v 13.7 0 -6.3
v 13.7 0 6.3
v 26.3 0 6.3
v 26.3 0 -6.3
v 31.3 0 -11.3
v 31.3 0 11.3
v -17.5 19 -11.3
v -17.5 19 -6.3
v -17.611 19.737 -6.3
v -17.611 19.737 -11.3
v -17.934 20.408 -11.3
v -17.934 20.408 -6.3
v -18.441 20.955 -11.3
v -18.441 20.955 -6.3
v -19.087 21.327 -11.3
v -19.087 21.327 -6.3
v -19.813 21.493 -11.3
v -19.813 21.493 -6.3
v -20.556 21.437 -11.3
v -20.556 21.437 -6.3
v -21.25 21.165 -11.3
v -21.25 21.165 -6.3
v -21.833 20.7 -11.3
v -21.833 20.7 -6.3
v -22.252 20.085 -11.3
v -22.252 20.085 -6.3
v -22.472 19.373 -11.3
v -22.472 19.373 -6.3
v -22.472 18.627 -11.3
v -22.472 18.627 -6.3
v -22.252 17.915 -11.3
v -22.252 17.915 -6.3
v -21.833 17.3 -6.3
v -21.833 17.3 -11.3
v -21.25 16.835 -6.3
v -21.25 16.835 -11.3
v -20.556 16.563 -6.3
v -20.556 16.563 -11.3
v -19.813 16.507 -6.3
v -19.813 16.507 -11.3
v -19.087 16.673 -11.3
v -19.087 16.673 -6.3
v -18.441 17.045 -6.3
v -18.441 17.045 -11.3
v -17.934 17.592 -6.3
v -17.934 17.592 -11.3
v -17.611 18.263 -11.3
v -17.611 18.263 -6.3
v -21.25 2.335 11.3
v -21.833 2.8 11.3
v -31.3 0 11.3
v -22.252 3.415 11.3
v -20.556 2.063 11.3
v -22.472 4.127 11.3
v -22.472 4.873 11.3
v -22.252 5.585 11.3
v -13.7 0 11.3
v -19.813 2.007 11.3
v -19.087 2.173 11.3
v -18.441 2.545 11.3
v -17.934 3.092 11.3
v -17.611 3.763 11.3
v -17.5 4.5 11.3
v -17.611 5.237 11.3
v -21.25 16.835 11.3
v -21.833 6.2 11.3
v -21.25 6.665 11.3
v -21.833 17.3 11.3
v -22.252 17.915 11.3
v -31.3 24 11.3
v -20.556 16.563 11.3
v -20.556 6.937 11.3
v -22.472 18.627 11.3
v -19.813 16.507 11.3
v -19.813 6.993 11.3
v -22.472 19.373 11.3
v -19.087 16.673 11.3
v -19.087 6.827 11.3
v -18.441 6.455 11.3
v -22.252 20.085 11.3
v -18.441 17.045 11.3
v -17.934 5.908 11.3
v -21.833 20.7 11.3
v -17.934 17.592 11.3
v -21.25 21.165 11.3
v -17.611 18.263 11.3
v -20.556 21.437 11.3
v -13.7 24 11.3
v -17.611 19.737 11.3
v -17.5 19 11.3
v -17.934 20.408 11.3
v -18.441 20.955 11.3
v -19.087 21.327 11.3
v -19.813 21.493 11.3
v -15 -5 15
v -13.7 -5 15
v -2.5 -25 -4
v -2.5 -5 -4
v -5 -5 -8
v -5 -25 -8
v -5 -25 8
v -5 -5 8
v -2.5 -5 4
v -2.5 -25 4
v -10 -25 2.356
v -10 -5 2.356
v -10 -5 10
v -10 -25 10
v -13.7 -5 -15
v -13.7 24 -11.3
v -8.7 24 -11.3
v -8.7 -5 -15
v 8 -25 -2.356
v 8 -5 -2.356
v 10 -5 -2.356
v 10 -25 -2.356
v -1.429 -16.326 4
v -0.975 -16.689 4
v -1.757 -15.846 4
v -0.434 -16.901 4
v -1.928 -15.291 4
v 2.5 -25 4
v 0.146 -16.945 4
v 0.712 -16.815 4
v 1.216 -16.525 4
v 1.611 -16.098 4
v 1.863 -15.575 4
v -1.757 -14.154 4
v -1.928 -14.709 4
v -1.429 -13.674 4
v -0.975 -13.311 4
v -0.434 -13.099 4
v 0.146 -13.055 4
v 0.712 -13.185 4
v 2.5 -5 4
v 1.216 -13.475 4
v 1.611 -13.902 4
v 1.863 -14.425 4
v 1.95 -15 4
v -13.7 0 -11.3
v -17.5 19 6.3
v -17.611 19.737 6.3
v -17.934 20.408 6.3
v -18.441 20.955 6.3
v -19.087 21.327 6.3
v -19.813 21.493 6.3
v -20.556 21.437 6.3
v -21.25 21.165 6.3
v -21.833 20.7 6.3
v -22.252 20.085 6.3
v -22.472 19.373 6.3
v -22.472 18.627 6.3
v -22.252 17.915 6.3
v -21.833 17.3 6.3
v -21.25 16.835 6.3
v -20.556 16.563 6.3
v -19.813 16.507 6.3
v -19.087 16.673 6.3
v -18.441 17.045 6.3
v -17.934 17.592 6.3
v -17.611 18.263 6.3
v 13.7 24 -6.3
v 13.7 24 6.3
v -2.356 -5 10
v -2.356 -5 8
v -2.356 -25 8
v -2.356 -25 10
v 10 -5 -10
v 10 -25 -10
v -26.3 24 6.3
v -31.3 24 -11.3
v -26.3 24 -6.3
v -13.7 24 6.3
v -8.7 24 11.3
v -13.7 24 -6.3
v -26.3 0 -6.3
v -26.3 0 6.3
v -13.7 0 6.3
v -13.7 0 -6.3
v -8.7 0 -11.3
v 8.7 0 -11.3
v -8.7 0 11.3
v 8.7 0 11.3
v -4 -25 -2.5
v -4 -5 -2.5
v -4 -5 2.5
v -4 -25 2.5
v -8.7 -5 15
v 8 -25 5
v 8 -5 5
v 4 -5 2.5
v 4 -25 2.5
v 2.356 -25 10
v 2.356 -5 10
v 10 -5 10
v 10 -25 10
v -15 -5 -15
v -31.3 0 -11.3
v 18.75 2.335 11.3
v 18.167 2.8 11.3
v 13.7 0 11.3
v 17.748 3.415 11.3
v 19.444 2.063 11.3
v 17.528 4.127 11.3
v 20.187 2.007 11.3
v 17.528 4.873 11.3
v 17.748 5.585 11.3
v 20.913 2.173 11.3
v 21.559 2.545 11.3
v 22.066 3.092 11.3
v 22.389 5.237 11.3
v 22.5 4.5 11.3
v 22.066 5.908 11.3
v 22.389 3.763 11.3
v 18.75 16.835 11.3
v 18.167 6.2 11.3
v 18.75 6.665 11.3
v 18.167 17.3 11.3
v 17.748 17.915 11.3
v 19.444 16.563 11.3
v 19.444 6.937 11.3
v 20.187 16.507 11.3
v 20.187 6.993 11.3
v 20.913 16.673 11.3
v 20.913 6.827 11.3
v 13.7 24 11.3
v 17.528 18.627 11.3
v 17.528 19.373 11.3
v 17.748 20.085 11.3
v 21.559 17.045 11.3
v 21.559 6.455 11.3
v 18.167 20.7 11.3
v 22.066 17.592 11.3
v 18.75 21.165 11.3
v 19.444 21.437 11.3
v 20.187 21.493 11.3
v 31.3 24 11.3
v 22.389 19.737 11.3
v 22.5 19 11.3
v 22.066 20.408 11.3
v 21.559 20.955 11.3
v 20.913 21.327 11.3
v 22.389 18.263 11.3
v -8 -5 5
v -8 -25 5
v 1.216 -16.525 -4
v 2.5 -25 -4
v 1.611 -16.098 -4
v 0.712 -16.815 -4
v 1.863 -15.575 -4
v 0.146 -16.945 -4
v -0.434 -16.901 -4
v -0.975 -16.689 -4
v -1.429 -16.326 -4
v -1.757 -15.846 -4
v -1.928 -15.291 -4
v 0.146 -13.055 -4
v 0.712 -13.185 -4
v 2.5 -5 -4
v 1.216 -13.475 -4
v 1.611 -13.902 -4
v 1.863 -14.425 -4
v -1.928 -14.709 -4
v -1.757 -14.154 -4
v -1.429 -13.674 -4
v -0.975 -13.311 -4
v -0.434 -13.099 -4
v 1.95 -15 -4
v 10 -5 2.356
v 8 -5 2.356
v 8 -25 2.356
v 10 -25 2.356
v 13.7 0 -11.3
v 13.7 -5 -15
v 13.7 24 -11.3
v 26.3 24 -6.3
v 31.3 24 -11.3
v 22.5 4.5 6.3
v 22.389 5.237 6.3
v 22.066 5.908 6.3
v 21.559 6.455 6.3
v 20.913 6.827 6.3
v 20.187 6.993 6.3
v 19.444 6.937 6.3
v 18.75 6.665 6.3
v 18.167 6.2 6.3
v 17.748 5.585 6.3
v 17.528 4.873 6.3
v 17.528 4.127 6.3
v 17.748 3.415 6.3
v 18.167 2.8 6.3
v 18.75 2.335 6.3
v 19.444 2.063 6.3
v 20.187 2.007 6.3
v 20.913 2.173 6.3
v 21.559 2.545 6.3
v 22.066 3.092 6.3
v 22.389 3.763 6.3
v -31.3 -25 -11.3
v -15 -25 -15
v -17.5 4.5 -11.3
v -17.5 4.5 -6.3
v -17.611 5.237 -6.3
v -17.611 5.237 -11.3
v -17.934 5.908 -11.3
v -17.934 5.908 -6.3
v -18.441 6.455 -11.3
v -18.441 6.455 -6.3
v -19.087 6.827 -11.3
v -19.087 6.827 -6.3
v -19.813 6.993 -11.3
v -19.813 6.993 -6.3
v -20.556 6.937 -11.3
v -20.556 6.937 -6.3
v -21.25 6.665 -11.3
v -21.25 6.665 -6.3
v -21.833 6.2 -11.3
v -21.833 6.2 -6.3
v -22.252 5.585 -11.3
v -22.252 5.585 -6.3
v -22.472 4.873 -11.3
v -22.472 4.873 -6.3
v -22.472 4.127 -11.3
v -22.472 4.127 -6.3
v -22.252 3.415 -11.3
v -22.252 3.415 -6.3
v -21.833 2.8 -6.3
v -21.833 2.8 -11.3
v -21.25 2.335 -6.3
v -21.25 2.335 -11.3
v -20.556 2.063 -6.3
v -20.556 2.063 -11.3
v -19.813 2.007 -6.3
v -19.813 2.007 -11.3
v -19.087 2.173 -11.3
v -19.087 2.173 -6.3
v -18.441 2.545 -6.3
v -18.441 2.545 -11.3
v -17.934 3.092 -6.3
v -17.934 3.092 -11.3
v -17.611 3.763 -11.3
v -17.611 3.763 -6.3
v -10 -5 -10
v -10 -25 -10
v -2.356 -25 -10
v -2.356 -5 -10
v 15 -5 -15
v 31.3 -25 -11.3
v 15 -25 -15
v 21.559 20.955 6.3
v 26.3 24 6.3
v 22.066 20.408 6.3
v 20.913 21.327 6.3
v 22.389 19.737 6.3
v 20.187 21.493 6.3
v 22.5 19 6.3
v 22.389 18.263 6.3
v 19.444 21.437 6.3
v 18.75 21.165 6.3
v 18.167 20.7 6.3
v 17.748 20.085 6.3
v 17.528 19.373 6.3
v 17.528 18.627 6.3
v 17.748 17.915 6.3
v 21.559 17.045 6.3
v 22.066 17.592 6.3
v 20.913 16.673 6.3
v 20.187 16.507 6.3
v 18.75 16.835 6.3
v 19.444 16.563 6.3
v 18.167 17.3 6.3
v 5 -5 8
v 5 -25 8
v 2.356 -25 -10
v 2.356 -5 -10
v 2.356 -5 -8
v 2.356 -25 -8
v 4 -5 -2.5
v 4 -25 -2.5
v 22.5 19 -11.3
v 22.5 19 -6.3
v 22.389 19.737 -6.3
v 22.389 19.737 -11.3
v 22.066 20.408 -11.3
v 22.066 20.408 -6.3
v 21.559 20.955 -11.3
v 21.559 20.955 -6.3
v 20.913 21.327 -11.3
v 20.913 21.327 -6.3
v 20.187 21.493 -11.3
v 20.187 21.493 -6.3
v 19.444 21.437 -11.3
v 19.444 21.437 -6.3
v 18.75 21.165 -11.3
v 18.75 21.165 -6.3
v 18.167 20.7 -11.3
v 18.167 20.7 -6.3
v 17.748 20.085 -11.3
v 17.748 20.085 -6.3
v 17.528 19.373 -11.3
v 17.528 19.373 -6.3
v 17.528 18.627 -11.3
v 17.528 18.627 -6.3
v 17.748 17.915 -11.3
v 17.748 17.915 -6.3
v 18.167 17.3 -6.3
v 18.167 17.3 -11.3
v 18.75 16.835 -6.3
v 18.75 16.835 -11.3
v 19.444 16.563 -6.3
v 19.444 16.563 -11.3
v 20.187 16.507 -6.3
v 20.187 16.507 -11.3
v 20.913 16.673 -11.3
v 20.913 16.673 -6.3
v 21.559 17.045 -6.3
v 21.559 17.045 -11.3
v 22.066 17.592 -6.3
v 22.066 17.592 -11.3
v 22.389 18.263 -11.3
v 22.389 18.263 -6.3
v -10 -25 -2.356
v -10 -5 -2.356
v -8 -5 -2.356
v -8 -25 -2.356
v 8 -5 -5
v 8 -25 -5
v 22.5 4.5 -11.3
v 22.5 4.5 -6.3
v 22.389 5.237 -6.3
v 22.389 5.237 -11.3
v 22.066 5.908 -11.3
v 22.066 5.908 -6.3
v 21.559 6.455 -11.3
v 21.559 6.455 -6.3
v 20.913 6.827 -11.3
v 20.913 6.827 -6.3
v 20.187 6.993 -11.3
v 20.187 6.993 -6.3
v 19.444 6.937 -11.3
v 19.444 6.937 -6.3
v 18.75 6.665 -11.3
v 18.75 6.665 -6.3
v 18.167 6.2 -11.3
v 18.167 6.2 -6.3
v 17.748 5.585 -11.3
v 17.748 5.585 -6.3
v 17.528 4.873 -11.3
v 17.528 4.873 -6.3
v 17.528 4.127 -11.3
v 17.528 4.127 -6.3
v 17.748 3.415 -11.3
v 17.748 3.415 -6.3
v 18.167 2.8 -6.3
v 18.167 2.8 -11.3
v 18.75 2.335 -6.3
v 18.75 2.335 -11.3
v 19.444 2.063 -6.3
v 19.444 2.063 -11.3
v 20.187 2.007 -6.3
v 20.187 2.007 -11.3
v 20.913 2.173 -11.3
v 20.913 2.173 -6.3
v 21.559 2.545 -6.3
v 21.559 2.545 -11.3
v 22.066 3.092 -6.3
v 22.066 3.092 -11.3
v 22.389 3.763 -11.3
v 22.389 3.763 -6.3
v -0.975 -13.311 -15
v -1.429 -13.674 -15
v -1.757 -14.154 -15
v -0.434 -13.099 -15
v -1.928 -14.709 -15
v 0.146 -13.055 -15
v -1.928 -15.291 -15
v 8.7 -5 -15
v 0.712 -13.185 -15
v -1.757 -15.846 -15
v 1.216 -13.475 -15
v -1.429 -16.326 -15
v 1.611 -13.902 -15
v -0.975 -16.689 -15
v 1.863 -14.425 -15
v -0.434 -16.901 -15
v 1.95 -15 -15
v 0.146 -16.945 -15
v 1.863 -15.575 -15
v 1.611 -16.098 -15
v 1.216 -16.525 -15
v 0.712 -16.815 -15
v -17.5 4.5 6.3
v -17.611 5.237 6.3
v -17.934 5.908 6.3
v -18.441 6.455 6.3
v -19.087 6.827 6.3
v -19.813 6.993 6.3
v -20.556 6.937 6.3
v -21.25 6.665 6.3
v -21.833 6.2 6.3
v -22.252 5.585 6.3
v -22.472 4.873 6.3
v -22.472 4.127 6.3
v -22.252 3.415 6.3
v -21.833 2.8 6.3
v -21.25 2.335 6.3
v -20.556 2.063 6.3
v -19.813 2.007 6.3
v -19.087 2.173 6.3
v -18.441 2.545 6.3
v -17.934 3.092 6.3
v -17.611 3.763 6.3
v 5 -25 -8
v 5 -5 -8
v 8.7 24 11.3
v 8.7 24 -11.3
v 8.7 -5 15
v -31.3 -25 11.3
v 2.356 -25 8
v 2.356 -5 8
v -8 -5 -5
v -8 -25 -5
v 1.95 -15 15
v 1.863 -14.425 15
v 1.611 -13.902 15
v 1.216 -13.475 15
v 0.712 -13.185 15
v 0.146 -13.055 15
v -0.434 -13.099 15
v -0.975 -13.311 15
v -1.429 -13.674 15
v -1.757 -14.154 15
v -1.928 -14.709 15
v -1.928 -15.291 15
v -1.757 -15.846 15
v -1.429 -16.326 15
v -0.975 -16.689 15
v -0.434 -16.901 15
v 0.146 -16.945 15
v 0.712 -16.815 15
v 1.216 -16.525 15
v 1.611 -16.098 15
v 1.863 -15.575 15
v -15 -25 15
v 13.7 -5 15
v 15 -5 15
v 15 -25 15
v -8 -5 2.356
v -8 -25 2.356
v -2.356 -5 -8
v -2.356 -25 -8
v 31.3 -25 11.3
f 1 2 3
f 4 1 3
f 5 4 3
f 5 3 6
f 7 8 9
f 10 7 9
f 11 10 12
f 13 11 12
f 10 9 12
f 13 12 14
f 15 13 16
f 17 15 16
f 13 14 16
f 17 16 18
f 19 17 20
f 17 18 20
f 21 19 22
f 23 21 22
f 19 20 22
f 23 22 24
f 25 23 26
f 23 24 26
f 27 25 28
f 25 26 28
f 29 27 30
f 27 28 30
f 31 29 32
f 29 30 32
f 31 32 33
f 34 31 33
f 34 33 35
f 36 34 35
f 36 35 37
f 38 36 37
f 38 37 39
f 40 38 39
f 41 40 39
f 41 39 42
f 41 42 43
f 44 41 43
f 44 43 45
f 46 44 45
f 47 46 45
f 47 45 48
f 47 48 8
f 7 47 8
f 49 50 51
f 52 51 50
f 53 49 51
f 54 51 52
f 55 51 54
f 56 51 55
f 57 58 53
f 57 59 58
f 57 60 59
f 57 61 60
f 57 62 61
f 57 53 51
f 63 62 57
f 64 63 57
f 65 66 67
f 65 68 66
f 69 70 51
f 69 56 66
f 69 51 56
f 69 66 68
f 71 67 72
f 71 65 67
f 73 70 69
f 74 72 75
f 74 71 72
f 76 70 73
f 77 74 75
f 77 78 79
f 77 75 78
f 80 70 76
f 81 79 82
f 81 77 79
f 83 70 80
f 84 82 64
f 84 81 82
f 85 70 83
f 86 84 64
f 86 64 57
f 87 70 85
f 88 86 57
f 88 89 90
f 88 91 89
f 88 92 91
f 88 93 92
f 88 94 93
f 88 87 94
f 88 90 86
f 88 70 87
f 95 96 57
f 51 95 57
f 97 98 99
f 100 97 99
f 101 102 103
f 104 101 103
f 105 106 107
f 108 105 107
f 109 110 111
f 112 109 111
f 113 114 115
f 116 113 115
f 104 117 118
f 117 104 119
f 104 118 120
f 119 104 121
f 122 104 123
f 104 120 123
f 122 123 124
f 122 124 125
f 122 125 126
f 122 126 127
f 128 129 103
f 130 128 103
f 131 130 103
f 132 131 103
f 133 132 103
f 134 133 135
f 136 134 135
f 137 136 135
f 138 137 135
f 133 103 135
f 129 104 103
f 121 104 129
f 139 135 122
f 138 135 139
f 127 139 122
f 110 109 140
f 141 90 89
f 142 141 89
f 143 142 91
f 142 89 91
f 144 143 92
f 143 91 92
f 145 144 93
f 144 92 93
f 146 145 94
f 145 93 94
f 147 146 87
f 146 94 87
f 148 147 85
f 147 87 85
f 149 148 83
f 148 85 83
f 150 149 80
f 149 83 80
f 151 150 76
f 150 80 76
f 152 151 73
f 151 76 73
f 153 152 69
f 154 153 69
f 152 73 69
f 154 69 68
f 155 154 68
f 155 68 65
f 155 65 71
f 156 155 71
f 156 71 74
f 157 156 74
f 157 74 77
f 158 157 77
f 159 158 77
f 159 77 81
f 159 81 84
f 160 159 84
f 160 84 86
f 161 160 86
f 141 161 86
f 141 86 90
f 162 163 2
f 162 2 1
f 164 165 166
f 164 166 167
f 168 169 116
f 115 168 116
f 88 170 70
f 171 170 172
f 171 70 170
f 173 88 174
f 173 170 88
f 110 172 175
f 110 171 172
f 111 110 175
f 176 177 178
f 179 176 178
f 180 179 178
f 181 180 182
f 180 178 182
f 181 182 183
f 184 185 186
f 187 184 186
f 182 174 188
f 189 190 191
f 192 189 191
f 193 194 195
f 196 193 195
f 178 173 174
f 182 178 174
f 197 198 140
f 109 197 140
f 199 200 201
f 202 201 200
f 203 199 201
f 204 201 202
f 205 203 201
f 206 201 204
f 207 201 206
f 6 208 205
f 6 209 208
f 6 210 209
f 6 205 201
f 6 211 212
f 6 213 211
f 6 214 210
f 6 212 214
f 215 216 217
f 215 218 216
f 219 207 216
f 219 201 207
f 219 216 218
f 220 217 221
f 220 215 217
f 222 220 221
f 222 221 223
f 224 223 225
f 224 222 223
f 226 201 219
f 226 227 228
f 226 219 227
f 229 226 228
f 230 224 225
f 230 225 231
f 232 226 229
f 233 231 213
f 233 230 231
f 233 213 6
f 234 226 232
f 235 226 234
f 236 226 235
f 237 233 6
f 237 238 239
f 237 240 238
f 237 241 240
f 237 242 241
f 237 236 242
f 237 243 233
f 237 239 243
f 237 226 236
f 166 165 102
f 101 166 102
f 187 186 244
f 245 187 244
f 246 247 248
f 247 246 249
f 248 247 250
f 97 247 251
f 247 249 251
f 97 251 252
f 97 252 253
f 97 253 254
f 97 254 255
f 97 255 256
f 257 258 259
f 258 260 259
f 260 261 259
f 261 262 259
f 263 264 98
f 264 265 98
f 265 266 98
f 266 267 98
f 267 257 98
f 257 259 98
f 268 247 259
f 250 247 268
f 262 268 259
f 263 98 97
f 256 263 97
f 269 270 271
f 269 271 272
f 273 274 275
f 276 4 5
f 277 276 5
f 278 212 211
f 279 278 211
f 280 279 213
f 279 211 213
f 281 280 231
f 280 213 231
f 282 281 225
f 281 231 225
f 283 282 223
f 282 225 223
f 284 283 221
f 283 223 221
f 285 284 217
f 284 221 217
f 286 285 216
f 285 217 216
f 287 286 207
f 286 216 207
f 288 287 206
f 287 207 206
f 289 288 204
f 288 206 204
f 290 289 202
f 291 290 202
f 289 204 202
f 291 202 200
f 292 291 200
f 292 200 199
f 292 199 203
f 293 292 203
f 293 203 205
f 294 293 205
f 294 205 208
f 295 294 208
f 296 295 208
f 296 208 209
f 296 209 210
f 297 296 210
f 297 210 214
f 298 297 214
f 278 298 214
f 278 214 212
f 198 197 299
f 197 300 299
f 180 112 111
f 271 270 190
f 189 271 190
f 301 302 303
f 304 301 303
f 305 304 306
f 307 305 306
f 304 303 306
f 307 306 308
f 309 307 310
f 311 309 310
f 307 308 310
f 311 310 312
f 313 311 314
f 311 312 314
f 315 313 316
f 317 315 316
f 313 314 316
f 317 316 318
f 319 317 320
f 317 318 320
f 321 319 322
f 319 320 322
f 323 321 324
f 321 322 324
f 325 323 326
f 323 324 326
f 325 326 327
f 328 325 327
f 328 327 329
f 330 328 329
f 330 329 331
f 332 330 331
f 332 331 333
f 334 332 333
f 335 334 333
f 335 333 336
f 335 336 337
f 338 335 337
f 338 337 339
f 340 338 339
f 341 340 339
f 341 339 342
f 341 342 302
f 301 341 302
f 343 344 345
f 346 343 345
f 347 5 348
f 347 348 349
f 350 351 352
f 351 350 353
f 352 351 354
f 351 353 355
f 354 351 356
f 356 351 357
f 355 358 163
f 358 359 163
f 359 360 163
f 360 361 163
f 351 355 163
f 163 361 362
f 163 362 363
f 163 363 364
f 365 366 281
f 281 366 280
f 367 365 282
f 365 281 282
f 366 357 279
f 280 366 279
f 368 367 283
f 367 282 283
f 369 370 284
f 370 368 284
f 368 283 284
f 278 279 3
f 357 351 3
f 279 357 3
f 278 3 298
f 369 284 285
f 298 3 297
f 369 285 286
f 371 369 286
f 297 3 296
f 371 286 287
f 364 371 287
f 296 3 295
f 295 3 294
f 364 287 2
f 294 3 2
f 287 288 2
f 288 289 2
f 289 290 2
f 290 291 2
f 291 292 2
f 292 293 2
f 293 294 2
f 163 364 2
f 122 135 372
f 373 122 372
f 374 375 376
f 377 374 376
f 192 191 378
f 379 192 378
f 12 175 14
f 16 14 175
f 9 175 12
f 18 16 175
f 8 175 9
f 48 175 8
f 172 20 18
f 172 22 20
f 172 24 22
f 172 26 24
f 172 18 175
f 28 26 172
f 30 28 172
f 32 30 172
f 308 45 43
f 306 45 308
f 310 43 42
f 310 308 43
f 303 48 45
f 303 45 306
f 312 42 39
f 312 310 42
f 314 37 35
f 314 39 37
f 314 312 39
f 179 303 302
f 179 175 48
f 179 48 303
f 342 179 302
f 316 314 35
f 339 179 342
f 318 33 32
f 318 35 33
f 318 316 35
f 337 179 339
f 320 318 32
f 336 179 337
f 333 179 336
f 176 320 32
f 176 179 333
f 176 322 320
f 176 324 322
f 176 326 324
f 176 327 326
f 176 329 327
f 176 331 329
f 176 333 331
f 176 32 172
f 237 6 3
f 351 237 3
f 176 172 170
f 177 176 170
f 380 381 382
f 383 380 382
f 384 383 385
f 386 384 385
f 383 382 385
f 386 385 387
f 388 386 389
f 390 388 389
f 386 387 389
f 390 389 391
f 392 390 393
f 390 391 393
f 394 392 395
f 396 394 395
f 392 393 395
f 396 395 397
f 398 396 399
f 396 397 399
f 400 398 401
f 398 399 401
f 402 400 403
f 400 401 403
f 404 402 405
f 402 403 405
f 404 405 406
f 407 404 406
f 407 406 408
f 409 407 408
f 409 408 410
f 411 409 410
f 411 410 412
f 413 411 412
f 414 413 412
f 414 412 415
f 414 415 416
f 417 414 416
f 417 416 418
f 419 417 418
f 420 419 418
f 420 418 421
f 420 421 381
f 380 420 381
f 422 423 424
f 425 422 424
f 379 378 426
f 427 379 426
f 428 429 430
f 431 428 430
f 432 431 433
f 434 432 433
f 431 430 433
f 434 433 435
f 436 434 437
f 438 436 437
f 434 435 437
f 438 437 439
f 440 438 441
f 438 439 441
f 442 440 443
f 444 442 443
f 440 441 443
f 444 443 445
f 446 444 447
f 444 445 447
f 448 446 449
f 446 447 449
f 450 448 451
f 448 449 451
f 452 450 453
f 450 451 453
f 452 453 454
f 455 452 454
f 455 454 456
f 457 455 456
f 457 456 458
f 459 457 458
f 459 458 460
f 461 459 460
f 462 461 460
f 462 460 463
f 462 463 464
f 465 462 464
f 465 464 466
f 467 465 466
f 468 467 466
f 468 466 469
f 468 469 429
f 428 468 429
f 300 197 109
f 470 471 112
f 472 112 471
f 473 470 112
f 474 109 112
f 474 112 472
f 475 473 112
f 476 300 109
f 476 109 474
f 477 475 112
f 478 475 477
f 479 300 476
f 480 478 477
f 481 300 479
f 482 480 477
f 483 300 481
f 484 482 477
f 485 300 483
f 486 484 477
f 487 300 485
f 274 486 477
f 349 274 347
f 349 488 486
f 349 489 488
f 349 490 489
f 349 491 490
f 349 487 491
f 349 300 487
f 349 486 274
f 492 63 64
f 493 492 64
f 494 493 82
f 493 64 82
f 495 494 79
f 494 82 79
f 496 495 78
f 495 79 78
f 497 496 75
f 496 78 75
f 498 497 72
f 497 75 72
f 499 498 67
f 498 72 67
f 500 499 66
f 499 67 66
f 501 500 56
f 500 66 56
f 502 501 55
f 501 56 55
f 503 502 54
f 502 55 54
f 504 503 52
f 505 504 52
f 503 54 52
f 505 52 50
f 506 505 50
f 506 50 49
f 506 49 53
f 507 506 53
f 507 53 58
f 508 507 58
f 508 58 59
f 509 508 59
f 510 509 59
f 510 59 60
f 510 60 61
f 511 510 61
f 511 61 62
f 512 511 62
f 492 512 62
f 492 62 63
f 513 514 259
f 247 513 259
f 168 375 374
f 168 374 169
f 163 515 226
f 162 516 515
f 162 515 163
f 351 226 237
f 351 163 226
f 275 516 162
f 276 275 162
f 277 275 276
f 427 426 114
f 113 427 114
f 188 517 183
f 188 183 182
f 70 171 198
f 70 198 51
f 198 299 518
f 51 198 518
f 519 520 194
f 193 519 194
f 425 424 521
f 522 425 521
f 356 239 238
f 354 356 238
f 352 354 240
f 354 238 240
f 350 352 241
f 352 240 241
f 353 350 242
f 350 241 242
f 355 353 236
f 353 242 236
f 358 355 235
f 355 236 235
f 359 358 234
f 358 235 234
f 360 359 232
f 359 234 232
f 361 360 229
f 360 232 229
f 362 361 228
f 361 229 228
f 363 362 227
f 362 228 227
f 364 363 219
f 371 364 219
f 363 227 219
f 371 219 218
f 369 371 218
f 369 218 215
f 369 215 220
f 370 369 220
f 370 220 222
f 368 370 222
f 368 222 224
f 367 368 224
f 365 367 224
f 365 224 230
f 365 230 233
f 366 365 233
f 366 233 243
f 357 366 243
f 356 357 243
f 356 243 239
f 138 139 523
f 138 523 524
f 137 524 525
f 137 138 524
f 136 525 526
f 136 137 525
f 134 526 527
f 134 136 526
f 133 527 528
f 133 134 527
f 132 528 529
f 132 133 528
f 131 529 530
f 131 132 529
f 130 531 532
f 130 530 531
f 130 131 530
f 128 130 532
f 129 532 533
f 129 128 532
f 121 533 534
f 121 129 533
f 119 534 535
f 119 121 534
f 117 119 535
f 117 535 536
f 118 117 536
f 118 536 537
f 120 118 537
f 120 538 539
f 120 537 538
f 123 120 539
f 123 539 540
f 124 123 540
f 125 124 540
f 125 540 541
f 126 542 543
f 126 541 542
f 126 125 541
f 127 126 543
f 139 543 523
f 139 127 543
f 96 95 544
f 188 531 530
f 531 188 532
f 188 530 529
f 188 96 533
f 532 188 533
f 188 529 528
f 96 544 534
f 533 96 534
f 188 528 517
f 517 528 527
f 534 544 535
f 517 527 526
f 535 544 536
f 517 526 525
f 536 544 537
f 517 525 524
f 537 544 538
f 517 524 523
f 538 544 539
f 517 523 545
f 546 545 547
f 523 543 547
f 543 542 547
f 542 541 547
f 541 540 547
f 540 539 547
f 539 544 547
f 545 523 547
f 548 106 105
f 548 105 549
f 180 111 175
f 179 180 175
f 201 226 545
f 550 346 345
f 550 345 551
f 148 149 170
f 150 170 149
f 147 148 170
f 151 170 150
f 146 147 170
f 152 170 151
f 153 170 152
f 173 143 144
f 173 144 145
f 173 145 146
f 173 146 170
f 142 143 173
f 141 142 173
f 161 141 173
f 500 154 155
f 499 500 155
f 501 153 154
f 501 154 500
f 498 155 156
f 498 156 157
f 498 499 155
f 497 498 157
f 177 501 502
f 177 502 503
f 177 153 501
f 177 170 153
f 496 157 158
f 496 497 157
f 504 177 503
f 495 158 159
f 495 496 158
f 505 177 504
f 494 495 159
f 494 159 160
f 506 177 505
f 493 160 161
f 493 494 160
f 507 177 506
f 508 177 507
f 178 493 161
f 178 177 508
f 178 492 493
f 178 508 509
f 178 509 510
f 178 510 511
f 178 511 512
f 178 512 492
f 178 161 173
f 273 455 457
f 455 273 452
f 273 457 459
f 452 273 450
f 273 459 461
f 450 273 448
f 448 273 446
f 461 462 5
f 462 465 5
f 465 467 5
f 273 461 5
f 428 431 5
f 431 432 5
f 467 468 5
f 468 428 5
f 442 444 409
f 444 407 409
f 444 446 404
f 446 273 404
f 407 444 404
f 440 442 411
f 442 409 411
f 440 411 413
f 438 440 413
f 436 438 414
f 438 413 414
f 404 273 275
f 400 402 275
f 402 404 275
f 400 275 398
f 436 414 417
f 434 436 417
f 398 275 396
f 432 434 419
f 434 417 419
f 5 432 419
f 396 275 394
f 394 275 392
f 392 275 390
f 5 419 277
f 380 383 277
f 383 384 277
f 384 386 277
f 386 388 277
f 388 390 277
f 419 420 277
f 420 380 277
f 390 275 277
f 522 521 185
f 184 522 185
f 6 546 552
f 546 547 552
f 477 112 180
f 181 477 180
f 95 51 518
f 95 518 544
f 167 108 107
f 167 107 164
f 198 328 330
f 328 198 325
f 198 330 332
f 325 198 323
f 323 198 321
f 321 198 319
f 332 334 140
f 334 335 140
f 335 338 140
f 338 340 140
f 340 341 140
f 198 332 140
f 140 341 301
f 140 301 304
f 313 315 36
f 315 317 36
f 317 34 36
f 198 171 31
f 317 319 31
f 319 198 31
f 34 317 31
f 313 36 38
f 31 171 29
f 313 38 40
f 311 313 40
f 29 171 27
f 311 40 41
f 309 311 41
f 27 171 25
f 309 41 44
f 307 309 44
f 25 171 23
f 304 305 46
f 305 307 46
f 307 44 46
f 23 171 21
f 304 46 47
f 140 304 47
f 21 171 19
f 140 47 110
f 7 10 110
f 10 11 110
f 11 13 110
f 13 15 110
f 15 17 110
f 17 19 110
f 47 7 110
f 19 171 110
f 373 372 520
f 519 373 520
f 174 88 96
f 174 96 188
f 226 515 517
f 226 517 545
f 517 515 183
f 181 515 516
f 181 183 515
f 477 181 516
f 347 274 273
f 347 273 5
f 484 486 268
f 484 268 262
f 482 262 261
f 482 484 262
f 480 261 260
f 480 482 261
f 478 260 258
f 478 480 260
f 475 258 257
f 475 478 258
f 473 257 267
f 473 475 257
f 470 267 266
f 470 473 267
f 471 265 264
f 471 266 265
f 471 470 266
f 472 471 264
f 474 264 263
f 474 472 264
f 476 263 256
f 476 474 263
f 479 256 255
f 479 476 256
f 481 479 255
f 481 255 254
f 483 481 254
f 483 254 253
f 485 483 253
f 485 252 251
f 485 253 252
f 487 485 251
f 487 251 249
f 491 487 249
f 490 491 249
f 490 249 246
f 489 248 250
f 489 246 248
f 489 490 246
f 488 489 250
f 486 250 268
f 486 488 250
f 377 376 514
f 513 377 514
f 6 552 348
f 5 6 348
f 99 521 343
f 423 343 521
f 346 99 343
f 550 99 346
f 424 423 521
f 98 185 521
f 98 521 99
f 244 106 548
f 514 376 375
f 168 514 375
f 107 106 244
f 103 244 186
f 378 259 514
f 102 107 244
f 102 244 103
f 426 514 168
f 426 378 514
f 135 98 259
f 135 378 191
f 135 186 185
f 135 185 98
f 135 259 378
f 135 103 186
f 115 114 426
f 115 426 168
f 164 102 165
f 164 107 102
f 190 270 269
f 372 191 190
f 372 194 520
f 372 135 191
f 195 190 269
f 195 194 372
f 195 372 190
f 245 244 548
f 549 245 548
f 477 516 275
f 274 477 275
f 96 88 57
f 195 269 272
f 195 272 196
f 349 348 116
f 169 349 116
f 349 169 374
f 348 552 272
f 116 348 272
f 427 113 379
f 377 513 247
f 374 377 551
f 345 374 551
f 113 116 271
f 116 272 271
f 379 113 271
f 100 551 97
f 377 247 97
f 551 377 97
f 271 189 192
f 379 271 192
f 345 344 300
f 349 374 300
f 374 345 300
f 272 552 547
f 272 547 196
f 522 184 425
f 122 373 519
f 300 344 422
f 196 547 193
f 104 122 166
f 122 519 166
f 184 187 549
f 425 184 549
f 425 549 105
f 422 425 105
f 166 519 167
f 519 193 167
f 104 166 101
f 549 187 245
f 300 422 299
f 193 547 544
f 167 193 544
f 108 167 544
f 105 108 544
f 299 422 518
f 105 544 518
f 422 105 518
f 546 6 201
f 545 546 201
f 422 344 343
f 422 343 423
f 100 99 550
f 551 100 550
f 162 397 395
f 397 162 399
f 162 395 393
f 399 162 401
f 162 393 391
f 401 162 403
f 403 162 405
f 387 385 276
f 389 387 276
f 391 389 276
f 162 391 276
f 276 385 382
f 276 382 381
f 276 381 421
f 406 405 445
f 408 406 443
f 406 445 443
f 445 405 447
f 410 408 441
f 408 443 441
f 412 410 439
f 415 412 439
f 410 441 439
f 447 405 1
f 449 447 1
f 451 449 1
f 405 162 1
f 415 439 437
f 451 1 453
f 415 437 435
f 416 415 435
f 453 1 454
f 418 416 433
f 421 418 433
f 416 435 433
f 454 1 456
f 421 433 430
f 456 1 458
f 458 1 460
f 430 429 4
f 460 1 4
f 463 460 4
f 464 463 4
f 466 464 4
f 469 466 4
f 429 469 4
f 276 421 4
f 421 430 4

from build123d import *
from OCP.BRepFilletAPI import BRepFilletAPI_MakeChamfer

# Parameters (mm, degrees)
BOSS_EXTRUDE1_DEPTH     = 24
SKETCH2_R               = 2.5
CUT_EXTRUDE1_DEPTH      = 46.458222579
SKETCH3_W               = 62.6
SKETCH3_H               = 22.6
BOSS_EXTRUDE2_DEPTH     = 5
SKETCH4_W               = 30
SKETCH4_H               = 30
SKETCH4_W_2             = 20
SKETCH4_H_2             = 20
BOSS_EXTRUDE3_DEPTH     = 20
SKETCH6_W               = 20
SKETCH6_H               = 20
BOSS_EXTRUDE4_DEPTH     = 20
SKETCH8_W               = 2
SKETCH8_H               = 4.711017494
SKETCH8_W_2             = 4.711017494
SKETCH8_H_2             = 2
BOSS_EXTRUDE5_DEPTH     = 20
SKETCH9_W               = 5
SKETCH9_H               = 3.7
BOSS_EXTRUDE6_DEPTH     = 29
CHAMFER1_SIZE           = 29
CHAMFER1_SIZE2          = 3.7
CHAMFER3_SIZE           = 3.7
CHAMFER3_SIZE_2         = 5
CHAMFER4_SIZE           = 5
CHAMFER4_SIZE_2         = 3.7
CHAMFER5_SIZE2          = 3.7
CHAMFER5_SIZE           = 5
CUT_EXTRUDE2_DEPTH      = 45.33610267
CUT_EXTRUDE2_DEPTH_BACK = 45.33610267
SKETCH11_R              = 1.95


# Some blends are built 0.0001 mm under size
with BuildPart() as part:
    # Sketch1 → Boss-Extrude1 (new body)
    with BuildSketch(Plane(origin=(0, 0, 0), x_dir=(1, 0, 0), z_dir=(0, 1, 0))):
        Polygon((-13.7, -6.3), (-8.7, -11.3), (-31.3, -11.3), (-31.3, 11.3), (-8.7, 11.3), (-13.7, 6.3), (-26.3, 6.3), (-26.3, -6.3), align=None)
        Polygon((8.7, 11.3), (8.7, 0), (13.7, 0), (13.7, 6.3), (26.3, 6.3), (31.3, 11.3), align=None)
        Polygon((13.7, 0), (8.7, 0), (8.7, -11.3), (31.3, -11.3), (26.3, -6.3), (13.7, -6.3), align=None)
    extrude(amount=BOSS_EXTRUDE1_DEPTH)

    # Sketch2 → Cut-Extrude1 (cut, through all)
    with BuildSketch(Plane.XY.offset(11.3)):
        with Locations((-20, 19)):
            Circle(SKETCH2_R)
        with Locations((-20, 4.5)):
            Circle(SKETCH2_R)
        with Locations((20, 4.5)):
            Circle(SKETCH2_R)
        with Locations((20, 19)):
            Circle(SKETCH2_R)
    extrude(amount=-CUT_EXTRUDE1_DEPTH, mode=Mode.SUBTRACT)

    # Sketch3 → Boss-Extrude2 (add)
    with BuildSketch(Plane.XZ):
        Rectangle(SKETCH3_W, SKETCH3_H)
    extrude(amount=BOSS_EXTRUDE2_DEPTH)

    # Sketch4 → Boss-Extrude3 (add)
    with BuildSketch(Plane.XZ.offset(5)):
        Rectangle(SKETCH4_W, SKETCH4_H)
        Rectangle(SKETCH4_W_2, SKETCH4_H_2, mode=Mode.SUBTRACT)
    extrude(amount=BOSS_EXTRUDE3_DEPTH)

    # Sketch6 → Boss-Extrude4 (add)
    with BuildSketch(Plane.XZ.offset(25)):
        Polygon((15, 15), (31.3, 11.3), (31.3, -11.3), (15, -15), (-15, -15), (-31.3, -11.3), (-31.3, 11.3), (-15, 15), align=None)
        Rectangle(SKETCH6_W, SKETCH6_H, mode=Mode.SUBTRACT)
    extrude(amount=-BOSS_EXTRUDE4_DEPTH)

    # Sketch8 → Boss-Extrude5 (add)
    with BuildSketch(Plane.XZ.offset(5)):
        Polygon((4, 2.5), (4, -2.5), (8, -5), (8, -2.355508747), (8, 2.355508747), (8, 5), align=None)
        with Locations((9, 0)):
            Rectangle(SKETCH8_W, SKETCH8_H)
        with Locations((0, 9)):
            Rectangle(SKETCH8_W_2, SKETCH8_H_2)
        Polygon((5, 8), (2.355508747, 8), (-2.355508747, 8), (-5, 8), (-2.5, 4), (2.5, 4), align=None)
        with Locations((-9, 0)):
            Rectangle(SKETCH8_W, SKETCH8_H)
        Polygon((-8, 2.355508747), (-8, -2.355508747), (-8, -5), (-4, -2.5), (-4, 2.5), (-8, 5), align=None)
        with Locations((0, -9)):
            Rectangle(SKETCH8_W_2, SKETCH8_H_2)
        Polygon((-2.355508747, -8), (2.355508747, -8), (5, -8), (2.5, -4), (-2.5, -4), (-5, -8), align=None)
    extrude(amount=BOSS_EXTRUDE5_DEPTH)

    # Sketch9 → Boss-Extrude6 (add)
    with BuildSketch(Plane(origin=(0, -5, 0), x_dir=(1, 0, 0), z_dir=(0, 1, 0))):
        with Locations((11.2, 13.15)):
            Rectangle(SKETCH9_W, SKETCH9_H)
        with Locations((11.2, -13.15)):
            Rectangle(SKETCH9_W, SKETCH9_H)
        with Locations((-11.2, 13.15)):
            Rectangle(SKETCH9_W, SKETCH9_H)
        with Locations((-11.2, -13.15)):
            Rectangle(SKETCH9_W, SKETCH9_H)
    extrude(amount=BOSS_EXTRUDE6_DEPTH)

    # Chamfer1: one chamfer whose edges measure the first distance from different faces: ONE call of the kernel's chamfer builder (chamfer() names one face for all edges)
    chamfer1_edges_1 = [part.edges().sort_by_distance(p)[0] for p in [
        (11.2, 24, -15),
        (-11.2, 24, -15),
    ]]
    chamfer1_side_1 = [part.faces().sort_by_distance(p)[0] for p in [
        (0, -7.016853933, -15),
    ]]
    chamfer1_edges_2 = [part.edges().sort_by_distance(p)[0] for p in [
        (-11.2, 24, 15),
        (11.2, 24, 15),
    ]]
    chamfer1_side_2 = [part.faces().sort_by_distance(p)[0] for p in [
        (0, -7.016853933, 15),
    ]]
    chamfer1 = BRepFilletAPI_MakeChamfer(part.part.solid().wrapped)
    for e in chamfer1_edges_1:
        chamfer1.Add(CHAMFER1_SIZE, CHAMFER1_SIZE2, e.wrapped, chamfer1_side_1[0].wrapped)  # the first distance lies on this face
    for e in chamfer1_edges_2:
        chamfer1.Add(CHAMFER1_SIZE, CHAMFER1_SIZE2, e.wrapped, chamfer1_side_2[0].wrapped)  # the first distance lies on this face
    add(Compound.cast(chamfer1.Shape()), mode=Mode.REPLACE)

    # Chamfer3
    # the kernel refuses this chamfer: 5, 3.7 mm, written as the material it adds along each edge
    with BuildSketch(Plane(origin=(21.605348649, -5, -11.3), x_dir=(0, -0.04206007695140814, -0.9991150834247482), z_dir=(-1, 0, 0))) as chamfer3_piece_1_section:
        Polygon((CHAMFER3_SIZE * 0.999115083425, -CHAMFER3_SIZE * 0.0420600769514), (-CHAMFER3_SIZE_2 * 0.0420600769514, -CHAMFER3_SIZE_2 * 0.999115083425), (0, 0), align=None)
    chamfer3_piece_1 = extrude(amount=43.210697297, mode=Mode.PRIVATE)
    chamfer3_piece_1 = split(chamfer3_piece_1, bisect_by=Plane(origin=(13.7, -3.301546392, -12.48628866), z_dir=(-1, 0, 0)), keep=Keep.TOP, mode=Mode.PRIVATE)
    chamfer3_piece_1 = split(chamfer3_piece_1, bisect_by=Plane(origin=(-13.7, -3.301546392, -12.48628866), z_dir=(1, 0, 0)), keep=Keep.TOP, mode=Mode.PRIVATE)
    add(chamfer3_piece_1)

    # Chamfer4
    chamfer4_edges_1 = [part.edges().sort_by_distance(p)[0] for p in [
        (22.5, -5, 11.3),
    ]]
    chamfer4_side_1 = [part.faces().sort_by_distance(p)[0] for p in [
        (22.5, -4.926, 11.3),
    ]]
    chamfer4_edges_2 = [part.edges().sort_by_distance(p)[0] for p in [
        (-22.5, -5, 11.3),
    ]]
    chamfer4_side_2 = [part.faces().sort_by_distance(p)[0] for p in [
        (-22.5, -4.926, 11.3),
    ]]
    chamfer4_edges_3 = [part.edges().sort_by_distance(p)[0] for p in [
        (22.5, -5, -11.3),
    ]]
    chamfer4_side_3 = [part.faces().sort_by_distance(p)[0] for p in [
        (22.5, -5, -11.374),
    ]]
    chamfer4_edges_4 = [part.edges().sort_by_distance(p)[0] for p in [
        (-22.5, -5, -11.3),
    ]]
    chamfer4_side_4 = [part.faces().sort_by_distance(p)[0] for p in [
        (-22.5, -5, -11.374),
    ]]
    chamfer4 = BRepFilletAPI_MakeChamfer(part.part.solid().wrapped)
    for e in chamfer4_edges_1:
        chamfer4.Add(CHAMFER4_SIZE - 0.0001, CHAMFER4_SIZE_2 - 0.0001, e.wrapped, chamfer4_side_1[0].wrapped)
    for e in chamfer4_edges_2:
        chamfer4.Add(CHAMFER4_SIZE - 0.0001, CHAMFER4_SIZE_2 - 0.0001, e.wrapped, chamfer4_side_2[0].wrapped)
    for e in chamfer4_edges_3:
        chamfer4.Add(CHAMFER4_SIZE_2 - 0.0001, CHAMFER4_SIZE - 0.0001, e.wrapped, chamfer4_side_3[0].wrapped)
    for e in chamfer4_edges_4:
        chamfer4.Add(CHAMFER4_SIZE_2 - 0.0001, CHAMFER4_SIZE - 0.0001, e.wrapped, chamfer4_side_4[0].wrapped)
    add(Compound.cast(chamfer4.Shape()), mode=Mode.REPLACE)  # a hair under: the kernel refuses the full size

    # Chamfer5
    chamfer5_edges = [part.edges().sort_by_distance(p)[0] for p in [
        (0, -5, 11.3),
    ]]
    chamfer5_side = [part.faces().sort_by_distance(p)[0] for p in [
        (0, -4.926, 11.3),
    ]]
    chamfer(chamfer5_edges, length=CHAMFER5_SIZE - 0.0001, length2=CHAMFER5_SIZE2 - 0.0001, reference=chamfer5_side[0])  # a hair under: the kernel refuses the full size

    # Sketch11 → Cut-Extrude2 (cut, two sides: drawn at the far end of the back side and taken through both)
    with BuildSketch(Plane.XY.offset(-4).offset(-CUT_EXTRUDE2_DEPTH_BACK)):
        with Locations((0, -15)):
            Circle(SKETCH11_R)
    extrude(amount=CUT_EXTRUDE2_DEPTH + CUT_EXTRUDE2_DEPTH_BACK, mode=Mode.SUBTRACT)


solid = part.part
